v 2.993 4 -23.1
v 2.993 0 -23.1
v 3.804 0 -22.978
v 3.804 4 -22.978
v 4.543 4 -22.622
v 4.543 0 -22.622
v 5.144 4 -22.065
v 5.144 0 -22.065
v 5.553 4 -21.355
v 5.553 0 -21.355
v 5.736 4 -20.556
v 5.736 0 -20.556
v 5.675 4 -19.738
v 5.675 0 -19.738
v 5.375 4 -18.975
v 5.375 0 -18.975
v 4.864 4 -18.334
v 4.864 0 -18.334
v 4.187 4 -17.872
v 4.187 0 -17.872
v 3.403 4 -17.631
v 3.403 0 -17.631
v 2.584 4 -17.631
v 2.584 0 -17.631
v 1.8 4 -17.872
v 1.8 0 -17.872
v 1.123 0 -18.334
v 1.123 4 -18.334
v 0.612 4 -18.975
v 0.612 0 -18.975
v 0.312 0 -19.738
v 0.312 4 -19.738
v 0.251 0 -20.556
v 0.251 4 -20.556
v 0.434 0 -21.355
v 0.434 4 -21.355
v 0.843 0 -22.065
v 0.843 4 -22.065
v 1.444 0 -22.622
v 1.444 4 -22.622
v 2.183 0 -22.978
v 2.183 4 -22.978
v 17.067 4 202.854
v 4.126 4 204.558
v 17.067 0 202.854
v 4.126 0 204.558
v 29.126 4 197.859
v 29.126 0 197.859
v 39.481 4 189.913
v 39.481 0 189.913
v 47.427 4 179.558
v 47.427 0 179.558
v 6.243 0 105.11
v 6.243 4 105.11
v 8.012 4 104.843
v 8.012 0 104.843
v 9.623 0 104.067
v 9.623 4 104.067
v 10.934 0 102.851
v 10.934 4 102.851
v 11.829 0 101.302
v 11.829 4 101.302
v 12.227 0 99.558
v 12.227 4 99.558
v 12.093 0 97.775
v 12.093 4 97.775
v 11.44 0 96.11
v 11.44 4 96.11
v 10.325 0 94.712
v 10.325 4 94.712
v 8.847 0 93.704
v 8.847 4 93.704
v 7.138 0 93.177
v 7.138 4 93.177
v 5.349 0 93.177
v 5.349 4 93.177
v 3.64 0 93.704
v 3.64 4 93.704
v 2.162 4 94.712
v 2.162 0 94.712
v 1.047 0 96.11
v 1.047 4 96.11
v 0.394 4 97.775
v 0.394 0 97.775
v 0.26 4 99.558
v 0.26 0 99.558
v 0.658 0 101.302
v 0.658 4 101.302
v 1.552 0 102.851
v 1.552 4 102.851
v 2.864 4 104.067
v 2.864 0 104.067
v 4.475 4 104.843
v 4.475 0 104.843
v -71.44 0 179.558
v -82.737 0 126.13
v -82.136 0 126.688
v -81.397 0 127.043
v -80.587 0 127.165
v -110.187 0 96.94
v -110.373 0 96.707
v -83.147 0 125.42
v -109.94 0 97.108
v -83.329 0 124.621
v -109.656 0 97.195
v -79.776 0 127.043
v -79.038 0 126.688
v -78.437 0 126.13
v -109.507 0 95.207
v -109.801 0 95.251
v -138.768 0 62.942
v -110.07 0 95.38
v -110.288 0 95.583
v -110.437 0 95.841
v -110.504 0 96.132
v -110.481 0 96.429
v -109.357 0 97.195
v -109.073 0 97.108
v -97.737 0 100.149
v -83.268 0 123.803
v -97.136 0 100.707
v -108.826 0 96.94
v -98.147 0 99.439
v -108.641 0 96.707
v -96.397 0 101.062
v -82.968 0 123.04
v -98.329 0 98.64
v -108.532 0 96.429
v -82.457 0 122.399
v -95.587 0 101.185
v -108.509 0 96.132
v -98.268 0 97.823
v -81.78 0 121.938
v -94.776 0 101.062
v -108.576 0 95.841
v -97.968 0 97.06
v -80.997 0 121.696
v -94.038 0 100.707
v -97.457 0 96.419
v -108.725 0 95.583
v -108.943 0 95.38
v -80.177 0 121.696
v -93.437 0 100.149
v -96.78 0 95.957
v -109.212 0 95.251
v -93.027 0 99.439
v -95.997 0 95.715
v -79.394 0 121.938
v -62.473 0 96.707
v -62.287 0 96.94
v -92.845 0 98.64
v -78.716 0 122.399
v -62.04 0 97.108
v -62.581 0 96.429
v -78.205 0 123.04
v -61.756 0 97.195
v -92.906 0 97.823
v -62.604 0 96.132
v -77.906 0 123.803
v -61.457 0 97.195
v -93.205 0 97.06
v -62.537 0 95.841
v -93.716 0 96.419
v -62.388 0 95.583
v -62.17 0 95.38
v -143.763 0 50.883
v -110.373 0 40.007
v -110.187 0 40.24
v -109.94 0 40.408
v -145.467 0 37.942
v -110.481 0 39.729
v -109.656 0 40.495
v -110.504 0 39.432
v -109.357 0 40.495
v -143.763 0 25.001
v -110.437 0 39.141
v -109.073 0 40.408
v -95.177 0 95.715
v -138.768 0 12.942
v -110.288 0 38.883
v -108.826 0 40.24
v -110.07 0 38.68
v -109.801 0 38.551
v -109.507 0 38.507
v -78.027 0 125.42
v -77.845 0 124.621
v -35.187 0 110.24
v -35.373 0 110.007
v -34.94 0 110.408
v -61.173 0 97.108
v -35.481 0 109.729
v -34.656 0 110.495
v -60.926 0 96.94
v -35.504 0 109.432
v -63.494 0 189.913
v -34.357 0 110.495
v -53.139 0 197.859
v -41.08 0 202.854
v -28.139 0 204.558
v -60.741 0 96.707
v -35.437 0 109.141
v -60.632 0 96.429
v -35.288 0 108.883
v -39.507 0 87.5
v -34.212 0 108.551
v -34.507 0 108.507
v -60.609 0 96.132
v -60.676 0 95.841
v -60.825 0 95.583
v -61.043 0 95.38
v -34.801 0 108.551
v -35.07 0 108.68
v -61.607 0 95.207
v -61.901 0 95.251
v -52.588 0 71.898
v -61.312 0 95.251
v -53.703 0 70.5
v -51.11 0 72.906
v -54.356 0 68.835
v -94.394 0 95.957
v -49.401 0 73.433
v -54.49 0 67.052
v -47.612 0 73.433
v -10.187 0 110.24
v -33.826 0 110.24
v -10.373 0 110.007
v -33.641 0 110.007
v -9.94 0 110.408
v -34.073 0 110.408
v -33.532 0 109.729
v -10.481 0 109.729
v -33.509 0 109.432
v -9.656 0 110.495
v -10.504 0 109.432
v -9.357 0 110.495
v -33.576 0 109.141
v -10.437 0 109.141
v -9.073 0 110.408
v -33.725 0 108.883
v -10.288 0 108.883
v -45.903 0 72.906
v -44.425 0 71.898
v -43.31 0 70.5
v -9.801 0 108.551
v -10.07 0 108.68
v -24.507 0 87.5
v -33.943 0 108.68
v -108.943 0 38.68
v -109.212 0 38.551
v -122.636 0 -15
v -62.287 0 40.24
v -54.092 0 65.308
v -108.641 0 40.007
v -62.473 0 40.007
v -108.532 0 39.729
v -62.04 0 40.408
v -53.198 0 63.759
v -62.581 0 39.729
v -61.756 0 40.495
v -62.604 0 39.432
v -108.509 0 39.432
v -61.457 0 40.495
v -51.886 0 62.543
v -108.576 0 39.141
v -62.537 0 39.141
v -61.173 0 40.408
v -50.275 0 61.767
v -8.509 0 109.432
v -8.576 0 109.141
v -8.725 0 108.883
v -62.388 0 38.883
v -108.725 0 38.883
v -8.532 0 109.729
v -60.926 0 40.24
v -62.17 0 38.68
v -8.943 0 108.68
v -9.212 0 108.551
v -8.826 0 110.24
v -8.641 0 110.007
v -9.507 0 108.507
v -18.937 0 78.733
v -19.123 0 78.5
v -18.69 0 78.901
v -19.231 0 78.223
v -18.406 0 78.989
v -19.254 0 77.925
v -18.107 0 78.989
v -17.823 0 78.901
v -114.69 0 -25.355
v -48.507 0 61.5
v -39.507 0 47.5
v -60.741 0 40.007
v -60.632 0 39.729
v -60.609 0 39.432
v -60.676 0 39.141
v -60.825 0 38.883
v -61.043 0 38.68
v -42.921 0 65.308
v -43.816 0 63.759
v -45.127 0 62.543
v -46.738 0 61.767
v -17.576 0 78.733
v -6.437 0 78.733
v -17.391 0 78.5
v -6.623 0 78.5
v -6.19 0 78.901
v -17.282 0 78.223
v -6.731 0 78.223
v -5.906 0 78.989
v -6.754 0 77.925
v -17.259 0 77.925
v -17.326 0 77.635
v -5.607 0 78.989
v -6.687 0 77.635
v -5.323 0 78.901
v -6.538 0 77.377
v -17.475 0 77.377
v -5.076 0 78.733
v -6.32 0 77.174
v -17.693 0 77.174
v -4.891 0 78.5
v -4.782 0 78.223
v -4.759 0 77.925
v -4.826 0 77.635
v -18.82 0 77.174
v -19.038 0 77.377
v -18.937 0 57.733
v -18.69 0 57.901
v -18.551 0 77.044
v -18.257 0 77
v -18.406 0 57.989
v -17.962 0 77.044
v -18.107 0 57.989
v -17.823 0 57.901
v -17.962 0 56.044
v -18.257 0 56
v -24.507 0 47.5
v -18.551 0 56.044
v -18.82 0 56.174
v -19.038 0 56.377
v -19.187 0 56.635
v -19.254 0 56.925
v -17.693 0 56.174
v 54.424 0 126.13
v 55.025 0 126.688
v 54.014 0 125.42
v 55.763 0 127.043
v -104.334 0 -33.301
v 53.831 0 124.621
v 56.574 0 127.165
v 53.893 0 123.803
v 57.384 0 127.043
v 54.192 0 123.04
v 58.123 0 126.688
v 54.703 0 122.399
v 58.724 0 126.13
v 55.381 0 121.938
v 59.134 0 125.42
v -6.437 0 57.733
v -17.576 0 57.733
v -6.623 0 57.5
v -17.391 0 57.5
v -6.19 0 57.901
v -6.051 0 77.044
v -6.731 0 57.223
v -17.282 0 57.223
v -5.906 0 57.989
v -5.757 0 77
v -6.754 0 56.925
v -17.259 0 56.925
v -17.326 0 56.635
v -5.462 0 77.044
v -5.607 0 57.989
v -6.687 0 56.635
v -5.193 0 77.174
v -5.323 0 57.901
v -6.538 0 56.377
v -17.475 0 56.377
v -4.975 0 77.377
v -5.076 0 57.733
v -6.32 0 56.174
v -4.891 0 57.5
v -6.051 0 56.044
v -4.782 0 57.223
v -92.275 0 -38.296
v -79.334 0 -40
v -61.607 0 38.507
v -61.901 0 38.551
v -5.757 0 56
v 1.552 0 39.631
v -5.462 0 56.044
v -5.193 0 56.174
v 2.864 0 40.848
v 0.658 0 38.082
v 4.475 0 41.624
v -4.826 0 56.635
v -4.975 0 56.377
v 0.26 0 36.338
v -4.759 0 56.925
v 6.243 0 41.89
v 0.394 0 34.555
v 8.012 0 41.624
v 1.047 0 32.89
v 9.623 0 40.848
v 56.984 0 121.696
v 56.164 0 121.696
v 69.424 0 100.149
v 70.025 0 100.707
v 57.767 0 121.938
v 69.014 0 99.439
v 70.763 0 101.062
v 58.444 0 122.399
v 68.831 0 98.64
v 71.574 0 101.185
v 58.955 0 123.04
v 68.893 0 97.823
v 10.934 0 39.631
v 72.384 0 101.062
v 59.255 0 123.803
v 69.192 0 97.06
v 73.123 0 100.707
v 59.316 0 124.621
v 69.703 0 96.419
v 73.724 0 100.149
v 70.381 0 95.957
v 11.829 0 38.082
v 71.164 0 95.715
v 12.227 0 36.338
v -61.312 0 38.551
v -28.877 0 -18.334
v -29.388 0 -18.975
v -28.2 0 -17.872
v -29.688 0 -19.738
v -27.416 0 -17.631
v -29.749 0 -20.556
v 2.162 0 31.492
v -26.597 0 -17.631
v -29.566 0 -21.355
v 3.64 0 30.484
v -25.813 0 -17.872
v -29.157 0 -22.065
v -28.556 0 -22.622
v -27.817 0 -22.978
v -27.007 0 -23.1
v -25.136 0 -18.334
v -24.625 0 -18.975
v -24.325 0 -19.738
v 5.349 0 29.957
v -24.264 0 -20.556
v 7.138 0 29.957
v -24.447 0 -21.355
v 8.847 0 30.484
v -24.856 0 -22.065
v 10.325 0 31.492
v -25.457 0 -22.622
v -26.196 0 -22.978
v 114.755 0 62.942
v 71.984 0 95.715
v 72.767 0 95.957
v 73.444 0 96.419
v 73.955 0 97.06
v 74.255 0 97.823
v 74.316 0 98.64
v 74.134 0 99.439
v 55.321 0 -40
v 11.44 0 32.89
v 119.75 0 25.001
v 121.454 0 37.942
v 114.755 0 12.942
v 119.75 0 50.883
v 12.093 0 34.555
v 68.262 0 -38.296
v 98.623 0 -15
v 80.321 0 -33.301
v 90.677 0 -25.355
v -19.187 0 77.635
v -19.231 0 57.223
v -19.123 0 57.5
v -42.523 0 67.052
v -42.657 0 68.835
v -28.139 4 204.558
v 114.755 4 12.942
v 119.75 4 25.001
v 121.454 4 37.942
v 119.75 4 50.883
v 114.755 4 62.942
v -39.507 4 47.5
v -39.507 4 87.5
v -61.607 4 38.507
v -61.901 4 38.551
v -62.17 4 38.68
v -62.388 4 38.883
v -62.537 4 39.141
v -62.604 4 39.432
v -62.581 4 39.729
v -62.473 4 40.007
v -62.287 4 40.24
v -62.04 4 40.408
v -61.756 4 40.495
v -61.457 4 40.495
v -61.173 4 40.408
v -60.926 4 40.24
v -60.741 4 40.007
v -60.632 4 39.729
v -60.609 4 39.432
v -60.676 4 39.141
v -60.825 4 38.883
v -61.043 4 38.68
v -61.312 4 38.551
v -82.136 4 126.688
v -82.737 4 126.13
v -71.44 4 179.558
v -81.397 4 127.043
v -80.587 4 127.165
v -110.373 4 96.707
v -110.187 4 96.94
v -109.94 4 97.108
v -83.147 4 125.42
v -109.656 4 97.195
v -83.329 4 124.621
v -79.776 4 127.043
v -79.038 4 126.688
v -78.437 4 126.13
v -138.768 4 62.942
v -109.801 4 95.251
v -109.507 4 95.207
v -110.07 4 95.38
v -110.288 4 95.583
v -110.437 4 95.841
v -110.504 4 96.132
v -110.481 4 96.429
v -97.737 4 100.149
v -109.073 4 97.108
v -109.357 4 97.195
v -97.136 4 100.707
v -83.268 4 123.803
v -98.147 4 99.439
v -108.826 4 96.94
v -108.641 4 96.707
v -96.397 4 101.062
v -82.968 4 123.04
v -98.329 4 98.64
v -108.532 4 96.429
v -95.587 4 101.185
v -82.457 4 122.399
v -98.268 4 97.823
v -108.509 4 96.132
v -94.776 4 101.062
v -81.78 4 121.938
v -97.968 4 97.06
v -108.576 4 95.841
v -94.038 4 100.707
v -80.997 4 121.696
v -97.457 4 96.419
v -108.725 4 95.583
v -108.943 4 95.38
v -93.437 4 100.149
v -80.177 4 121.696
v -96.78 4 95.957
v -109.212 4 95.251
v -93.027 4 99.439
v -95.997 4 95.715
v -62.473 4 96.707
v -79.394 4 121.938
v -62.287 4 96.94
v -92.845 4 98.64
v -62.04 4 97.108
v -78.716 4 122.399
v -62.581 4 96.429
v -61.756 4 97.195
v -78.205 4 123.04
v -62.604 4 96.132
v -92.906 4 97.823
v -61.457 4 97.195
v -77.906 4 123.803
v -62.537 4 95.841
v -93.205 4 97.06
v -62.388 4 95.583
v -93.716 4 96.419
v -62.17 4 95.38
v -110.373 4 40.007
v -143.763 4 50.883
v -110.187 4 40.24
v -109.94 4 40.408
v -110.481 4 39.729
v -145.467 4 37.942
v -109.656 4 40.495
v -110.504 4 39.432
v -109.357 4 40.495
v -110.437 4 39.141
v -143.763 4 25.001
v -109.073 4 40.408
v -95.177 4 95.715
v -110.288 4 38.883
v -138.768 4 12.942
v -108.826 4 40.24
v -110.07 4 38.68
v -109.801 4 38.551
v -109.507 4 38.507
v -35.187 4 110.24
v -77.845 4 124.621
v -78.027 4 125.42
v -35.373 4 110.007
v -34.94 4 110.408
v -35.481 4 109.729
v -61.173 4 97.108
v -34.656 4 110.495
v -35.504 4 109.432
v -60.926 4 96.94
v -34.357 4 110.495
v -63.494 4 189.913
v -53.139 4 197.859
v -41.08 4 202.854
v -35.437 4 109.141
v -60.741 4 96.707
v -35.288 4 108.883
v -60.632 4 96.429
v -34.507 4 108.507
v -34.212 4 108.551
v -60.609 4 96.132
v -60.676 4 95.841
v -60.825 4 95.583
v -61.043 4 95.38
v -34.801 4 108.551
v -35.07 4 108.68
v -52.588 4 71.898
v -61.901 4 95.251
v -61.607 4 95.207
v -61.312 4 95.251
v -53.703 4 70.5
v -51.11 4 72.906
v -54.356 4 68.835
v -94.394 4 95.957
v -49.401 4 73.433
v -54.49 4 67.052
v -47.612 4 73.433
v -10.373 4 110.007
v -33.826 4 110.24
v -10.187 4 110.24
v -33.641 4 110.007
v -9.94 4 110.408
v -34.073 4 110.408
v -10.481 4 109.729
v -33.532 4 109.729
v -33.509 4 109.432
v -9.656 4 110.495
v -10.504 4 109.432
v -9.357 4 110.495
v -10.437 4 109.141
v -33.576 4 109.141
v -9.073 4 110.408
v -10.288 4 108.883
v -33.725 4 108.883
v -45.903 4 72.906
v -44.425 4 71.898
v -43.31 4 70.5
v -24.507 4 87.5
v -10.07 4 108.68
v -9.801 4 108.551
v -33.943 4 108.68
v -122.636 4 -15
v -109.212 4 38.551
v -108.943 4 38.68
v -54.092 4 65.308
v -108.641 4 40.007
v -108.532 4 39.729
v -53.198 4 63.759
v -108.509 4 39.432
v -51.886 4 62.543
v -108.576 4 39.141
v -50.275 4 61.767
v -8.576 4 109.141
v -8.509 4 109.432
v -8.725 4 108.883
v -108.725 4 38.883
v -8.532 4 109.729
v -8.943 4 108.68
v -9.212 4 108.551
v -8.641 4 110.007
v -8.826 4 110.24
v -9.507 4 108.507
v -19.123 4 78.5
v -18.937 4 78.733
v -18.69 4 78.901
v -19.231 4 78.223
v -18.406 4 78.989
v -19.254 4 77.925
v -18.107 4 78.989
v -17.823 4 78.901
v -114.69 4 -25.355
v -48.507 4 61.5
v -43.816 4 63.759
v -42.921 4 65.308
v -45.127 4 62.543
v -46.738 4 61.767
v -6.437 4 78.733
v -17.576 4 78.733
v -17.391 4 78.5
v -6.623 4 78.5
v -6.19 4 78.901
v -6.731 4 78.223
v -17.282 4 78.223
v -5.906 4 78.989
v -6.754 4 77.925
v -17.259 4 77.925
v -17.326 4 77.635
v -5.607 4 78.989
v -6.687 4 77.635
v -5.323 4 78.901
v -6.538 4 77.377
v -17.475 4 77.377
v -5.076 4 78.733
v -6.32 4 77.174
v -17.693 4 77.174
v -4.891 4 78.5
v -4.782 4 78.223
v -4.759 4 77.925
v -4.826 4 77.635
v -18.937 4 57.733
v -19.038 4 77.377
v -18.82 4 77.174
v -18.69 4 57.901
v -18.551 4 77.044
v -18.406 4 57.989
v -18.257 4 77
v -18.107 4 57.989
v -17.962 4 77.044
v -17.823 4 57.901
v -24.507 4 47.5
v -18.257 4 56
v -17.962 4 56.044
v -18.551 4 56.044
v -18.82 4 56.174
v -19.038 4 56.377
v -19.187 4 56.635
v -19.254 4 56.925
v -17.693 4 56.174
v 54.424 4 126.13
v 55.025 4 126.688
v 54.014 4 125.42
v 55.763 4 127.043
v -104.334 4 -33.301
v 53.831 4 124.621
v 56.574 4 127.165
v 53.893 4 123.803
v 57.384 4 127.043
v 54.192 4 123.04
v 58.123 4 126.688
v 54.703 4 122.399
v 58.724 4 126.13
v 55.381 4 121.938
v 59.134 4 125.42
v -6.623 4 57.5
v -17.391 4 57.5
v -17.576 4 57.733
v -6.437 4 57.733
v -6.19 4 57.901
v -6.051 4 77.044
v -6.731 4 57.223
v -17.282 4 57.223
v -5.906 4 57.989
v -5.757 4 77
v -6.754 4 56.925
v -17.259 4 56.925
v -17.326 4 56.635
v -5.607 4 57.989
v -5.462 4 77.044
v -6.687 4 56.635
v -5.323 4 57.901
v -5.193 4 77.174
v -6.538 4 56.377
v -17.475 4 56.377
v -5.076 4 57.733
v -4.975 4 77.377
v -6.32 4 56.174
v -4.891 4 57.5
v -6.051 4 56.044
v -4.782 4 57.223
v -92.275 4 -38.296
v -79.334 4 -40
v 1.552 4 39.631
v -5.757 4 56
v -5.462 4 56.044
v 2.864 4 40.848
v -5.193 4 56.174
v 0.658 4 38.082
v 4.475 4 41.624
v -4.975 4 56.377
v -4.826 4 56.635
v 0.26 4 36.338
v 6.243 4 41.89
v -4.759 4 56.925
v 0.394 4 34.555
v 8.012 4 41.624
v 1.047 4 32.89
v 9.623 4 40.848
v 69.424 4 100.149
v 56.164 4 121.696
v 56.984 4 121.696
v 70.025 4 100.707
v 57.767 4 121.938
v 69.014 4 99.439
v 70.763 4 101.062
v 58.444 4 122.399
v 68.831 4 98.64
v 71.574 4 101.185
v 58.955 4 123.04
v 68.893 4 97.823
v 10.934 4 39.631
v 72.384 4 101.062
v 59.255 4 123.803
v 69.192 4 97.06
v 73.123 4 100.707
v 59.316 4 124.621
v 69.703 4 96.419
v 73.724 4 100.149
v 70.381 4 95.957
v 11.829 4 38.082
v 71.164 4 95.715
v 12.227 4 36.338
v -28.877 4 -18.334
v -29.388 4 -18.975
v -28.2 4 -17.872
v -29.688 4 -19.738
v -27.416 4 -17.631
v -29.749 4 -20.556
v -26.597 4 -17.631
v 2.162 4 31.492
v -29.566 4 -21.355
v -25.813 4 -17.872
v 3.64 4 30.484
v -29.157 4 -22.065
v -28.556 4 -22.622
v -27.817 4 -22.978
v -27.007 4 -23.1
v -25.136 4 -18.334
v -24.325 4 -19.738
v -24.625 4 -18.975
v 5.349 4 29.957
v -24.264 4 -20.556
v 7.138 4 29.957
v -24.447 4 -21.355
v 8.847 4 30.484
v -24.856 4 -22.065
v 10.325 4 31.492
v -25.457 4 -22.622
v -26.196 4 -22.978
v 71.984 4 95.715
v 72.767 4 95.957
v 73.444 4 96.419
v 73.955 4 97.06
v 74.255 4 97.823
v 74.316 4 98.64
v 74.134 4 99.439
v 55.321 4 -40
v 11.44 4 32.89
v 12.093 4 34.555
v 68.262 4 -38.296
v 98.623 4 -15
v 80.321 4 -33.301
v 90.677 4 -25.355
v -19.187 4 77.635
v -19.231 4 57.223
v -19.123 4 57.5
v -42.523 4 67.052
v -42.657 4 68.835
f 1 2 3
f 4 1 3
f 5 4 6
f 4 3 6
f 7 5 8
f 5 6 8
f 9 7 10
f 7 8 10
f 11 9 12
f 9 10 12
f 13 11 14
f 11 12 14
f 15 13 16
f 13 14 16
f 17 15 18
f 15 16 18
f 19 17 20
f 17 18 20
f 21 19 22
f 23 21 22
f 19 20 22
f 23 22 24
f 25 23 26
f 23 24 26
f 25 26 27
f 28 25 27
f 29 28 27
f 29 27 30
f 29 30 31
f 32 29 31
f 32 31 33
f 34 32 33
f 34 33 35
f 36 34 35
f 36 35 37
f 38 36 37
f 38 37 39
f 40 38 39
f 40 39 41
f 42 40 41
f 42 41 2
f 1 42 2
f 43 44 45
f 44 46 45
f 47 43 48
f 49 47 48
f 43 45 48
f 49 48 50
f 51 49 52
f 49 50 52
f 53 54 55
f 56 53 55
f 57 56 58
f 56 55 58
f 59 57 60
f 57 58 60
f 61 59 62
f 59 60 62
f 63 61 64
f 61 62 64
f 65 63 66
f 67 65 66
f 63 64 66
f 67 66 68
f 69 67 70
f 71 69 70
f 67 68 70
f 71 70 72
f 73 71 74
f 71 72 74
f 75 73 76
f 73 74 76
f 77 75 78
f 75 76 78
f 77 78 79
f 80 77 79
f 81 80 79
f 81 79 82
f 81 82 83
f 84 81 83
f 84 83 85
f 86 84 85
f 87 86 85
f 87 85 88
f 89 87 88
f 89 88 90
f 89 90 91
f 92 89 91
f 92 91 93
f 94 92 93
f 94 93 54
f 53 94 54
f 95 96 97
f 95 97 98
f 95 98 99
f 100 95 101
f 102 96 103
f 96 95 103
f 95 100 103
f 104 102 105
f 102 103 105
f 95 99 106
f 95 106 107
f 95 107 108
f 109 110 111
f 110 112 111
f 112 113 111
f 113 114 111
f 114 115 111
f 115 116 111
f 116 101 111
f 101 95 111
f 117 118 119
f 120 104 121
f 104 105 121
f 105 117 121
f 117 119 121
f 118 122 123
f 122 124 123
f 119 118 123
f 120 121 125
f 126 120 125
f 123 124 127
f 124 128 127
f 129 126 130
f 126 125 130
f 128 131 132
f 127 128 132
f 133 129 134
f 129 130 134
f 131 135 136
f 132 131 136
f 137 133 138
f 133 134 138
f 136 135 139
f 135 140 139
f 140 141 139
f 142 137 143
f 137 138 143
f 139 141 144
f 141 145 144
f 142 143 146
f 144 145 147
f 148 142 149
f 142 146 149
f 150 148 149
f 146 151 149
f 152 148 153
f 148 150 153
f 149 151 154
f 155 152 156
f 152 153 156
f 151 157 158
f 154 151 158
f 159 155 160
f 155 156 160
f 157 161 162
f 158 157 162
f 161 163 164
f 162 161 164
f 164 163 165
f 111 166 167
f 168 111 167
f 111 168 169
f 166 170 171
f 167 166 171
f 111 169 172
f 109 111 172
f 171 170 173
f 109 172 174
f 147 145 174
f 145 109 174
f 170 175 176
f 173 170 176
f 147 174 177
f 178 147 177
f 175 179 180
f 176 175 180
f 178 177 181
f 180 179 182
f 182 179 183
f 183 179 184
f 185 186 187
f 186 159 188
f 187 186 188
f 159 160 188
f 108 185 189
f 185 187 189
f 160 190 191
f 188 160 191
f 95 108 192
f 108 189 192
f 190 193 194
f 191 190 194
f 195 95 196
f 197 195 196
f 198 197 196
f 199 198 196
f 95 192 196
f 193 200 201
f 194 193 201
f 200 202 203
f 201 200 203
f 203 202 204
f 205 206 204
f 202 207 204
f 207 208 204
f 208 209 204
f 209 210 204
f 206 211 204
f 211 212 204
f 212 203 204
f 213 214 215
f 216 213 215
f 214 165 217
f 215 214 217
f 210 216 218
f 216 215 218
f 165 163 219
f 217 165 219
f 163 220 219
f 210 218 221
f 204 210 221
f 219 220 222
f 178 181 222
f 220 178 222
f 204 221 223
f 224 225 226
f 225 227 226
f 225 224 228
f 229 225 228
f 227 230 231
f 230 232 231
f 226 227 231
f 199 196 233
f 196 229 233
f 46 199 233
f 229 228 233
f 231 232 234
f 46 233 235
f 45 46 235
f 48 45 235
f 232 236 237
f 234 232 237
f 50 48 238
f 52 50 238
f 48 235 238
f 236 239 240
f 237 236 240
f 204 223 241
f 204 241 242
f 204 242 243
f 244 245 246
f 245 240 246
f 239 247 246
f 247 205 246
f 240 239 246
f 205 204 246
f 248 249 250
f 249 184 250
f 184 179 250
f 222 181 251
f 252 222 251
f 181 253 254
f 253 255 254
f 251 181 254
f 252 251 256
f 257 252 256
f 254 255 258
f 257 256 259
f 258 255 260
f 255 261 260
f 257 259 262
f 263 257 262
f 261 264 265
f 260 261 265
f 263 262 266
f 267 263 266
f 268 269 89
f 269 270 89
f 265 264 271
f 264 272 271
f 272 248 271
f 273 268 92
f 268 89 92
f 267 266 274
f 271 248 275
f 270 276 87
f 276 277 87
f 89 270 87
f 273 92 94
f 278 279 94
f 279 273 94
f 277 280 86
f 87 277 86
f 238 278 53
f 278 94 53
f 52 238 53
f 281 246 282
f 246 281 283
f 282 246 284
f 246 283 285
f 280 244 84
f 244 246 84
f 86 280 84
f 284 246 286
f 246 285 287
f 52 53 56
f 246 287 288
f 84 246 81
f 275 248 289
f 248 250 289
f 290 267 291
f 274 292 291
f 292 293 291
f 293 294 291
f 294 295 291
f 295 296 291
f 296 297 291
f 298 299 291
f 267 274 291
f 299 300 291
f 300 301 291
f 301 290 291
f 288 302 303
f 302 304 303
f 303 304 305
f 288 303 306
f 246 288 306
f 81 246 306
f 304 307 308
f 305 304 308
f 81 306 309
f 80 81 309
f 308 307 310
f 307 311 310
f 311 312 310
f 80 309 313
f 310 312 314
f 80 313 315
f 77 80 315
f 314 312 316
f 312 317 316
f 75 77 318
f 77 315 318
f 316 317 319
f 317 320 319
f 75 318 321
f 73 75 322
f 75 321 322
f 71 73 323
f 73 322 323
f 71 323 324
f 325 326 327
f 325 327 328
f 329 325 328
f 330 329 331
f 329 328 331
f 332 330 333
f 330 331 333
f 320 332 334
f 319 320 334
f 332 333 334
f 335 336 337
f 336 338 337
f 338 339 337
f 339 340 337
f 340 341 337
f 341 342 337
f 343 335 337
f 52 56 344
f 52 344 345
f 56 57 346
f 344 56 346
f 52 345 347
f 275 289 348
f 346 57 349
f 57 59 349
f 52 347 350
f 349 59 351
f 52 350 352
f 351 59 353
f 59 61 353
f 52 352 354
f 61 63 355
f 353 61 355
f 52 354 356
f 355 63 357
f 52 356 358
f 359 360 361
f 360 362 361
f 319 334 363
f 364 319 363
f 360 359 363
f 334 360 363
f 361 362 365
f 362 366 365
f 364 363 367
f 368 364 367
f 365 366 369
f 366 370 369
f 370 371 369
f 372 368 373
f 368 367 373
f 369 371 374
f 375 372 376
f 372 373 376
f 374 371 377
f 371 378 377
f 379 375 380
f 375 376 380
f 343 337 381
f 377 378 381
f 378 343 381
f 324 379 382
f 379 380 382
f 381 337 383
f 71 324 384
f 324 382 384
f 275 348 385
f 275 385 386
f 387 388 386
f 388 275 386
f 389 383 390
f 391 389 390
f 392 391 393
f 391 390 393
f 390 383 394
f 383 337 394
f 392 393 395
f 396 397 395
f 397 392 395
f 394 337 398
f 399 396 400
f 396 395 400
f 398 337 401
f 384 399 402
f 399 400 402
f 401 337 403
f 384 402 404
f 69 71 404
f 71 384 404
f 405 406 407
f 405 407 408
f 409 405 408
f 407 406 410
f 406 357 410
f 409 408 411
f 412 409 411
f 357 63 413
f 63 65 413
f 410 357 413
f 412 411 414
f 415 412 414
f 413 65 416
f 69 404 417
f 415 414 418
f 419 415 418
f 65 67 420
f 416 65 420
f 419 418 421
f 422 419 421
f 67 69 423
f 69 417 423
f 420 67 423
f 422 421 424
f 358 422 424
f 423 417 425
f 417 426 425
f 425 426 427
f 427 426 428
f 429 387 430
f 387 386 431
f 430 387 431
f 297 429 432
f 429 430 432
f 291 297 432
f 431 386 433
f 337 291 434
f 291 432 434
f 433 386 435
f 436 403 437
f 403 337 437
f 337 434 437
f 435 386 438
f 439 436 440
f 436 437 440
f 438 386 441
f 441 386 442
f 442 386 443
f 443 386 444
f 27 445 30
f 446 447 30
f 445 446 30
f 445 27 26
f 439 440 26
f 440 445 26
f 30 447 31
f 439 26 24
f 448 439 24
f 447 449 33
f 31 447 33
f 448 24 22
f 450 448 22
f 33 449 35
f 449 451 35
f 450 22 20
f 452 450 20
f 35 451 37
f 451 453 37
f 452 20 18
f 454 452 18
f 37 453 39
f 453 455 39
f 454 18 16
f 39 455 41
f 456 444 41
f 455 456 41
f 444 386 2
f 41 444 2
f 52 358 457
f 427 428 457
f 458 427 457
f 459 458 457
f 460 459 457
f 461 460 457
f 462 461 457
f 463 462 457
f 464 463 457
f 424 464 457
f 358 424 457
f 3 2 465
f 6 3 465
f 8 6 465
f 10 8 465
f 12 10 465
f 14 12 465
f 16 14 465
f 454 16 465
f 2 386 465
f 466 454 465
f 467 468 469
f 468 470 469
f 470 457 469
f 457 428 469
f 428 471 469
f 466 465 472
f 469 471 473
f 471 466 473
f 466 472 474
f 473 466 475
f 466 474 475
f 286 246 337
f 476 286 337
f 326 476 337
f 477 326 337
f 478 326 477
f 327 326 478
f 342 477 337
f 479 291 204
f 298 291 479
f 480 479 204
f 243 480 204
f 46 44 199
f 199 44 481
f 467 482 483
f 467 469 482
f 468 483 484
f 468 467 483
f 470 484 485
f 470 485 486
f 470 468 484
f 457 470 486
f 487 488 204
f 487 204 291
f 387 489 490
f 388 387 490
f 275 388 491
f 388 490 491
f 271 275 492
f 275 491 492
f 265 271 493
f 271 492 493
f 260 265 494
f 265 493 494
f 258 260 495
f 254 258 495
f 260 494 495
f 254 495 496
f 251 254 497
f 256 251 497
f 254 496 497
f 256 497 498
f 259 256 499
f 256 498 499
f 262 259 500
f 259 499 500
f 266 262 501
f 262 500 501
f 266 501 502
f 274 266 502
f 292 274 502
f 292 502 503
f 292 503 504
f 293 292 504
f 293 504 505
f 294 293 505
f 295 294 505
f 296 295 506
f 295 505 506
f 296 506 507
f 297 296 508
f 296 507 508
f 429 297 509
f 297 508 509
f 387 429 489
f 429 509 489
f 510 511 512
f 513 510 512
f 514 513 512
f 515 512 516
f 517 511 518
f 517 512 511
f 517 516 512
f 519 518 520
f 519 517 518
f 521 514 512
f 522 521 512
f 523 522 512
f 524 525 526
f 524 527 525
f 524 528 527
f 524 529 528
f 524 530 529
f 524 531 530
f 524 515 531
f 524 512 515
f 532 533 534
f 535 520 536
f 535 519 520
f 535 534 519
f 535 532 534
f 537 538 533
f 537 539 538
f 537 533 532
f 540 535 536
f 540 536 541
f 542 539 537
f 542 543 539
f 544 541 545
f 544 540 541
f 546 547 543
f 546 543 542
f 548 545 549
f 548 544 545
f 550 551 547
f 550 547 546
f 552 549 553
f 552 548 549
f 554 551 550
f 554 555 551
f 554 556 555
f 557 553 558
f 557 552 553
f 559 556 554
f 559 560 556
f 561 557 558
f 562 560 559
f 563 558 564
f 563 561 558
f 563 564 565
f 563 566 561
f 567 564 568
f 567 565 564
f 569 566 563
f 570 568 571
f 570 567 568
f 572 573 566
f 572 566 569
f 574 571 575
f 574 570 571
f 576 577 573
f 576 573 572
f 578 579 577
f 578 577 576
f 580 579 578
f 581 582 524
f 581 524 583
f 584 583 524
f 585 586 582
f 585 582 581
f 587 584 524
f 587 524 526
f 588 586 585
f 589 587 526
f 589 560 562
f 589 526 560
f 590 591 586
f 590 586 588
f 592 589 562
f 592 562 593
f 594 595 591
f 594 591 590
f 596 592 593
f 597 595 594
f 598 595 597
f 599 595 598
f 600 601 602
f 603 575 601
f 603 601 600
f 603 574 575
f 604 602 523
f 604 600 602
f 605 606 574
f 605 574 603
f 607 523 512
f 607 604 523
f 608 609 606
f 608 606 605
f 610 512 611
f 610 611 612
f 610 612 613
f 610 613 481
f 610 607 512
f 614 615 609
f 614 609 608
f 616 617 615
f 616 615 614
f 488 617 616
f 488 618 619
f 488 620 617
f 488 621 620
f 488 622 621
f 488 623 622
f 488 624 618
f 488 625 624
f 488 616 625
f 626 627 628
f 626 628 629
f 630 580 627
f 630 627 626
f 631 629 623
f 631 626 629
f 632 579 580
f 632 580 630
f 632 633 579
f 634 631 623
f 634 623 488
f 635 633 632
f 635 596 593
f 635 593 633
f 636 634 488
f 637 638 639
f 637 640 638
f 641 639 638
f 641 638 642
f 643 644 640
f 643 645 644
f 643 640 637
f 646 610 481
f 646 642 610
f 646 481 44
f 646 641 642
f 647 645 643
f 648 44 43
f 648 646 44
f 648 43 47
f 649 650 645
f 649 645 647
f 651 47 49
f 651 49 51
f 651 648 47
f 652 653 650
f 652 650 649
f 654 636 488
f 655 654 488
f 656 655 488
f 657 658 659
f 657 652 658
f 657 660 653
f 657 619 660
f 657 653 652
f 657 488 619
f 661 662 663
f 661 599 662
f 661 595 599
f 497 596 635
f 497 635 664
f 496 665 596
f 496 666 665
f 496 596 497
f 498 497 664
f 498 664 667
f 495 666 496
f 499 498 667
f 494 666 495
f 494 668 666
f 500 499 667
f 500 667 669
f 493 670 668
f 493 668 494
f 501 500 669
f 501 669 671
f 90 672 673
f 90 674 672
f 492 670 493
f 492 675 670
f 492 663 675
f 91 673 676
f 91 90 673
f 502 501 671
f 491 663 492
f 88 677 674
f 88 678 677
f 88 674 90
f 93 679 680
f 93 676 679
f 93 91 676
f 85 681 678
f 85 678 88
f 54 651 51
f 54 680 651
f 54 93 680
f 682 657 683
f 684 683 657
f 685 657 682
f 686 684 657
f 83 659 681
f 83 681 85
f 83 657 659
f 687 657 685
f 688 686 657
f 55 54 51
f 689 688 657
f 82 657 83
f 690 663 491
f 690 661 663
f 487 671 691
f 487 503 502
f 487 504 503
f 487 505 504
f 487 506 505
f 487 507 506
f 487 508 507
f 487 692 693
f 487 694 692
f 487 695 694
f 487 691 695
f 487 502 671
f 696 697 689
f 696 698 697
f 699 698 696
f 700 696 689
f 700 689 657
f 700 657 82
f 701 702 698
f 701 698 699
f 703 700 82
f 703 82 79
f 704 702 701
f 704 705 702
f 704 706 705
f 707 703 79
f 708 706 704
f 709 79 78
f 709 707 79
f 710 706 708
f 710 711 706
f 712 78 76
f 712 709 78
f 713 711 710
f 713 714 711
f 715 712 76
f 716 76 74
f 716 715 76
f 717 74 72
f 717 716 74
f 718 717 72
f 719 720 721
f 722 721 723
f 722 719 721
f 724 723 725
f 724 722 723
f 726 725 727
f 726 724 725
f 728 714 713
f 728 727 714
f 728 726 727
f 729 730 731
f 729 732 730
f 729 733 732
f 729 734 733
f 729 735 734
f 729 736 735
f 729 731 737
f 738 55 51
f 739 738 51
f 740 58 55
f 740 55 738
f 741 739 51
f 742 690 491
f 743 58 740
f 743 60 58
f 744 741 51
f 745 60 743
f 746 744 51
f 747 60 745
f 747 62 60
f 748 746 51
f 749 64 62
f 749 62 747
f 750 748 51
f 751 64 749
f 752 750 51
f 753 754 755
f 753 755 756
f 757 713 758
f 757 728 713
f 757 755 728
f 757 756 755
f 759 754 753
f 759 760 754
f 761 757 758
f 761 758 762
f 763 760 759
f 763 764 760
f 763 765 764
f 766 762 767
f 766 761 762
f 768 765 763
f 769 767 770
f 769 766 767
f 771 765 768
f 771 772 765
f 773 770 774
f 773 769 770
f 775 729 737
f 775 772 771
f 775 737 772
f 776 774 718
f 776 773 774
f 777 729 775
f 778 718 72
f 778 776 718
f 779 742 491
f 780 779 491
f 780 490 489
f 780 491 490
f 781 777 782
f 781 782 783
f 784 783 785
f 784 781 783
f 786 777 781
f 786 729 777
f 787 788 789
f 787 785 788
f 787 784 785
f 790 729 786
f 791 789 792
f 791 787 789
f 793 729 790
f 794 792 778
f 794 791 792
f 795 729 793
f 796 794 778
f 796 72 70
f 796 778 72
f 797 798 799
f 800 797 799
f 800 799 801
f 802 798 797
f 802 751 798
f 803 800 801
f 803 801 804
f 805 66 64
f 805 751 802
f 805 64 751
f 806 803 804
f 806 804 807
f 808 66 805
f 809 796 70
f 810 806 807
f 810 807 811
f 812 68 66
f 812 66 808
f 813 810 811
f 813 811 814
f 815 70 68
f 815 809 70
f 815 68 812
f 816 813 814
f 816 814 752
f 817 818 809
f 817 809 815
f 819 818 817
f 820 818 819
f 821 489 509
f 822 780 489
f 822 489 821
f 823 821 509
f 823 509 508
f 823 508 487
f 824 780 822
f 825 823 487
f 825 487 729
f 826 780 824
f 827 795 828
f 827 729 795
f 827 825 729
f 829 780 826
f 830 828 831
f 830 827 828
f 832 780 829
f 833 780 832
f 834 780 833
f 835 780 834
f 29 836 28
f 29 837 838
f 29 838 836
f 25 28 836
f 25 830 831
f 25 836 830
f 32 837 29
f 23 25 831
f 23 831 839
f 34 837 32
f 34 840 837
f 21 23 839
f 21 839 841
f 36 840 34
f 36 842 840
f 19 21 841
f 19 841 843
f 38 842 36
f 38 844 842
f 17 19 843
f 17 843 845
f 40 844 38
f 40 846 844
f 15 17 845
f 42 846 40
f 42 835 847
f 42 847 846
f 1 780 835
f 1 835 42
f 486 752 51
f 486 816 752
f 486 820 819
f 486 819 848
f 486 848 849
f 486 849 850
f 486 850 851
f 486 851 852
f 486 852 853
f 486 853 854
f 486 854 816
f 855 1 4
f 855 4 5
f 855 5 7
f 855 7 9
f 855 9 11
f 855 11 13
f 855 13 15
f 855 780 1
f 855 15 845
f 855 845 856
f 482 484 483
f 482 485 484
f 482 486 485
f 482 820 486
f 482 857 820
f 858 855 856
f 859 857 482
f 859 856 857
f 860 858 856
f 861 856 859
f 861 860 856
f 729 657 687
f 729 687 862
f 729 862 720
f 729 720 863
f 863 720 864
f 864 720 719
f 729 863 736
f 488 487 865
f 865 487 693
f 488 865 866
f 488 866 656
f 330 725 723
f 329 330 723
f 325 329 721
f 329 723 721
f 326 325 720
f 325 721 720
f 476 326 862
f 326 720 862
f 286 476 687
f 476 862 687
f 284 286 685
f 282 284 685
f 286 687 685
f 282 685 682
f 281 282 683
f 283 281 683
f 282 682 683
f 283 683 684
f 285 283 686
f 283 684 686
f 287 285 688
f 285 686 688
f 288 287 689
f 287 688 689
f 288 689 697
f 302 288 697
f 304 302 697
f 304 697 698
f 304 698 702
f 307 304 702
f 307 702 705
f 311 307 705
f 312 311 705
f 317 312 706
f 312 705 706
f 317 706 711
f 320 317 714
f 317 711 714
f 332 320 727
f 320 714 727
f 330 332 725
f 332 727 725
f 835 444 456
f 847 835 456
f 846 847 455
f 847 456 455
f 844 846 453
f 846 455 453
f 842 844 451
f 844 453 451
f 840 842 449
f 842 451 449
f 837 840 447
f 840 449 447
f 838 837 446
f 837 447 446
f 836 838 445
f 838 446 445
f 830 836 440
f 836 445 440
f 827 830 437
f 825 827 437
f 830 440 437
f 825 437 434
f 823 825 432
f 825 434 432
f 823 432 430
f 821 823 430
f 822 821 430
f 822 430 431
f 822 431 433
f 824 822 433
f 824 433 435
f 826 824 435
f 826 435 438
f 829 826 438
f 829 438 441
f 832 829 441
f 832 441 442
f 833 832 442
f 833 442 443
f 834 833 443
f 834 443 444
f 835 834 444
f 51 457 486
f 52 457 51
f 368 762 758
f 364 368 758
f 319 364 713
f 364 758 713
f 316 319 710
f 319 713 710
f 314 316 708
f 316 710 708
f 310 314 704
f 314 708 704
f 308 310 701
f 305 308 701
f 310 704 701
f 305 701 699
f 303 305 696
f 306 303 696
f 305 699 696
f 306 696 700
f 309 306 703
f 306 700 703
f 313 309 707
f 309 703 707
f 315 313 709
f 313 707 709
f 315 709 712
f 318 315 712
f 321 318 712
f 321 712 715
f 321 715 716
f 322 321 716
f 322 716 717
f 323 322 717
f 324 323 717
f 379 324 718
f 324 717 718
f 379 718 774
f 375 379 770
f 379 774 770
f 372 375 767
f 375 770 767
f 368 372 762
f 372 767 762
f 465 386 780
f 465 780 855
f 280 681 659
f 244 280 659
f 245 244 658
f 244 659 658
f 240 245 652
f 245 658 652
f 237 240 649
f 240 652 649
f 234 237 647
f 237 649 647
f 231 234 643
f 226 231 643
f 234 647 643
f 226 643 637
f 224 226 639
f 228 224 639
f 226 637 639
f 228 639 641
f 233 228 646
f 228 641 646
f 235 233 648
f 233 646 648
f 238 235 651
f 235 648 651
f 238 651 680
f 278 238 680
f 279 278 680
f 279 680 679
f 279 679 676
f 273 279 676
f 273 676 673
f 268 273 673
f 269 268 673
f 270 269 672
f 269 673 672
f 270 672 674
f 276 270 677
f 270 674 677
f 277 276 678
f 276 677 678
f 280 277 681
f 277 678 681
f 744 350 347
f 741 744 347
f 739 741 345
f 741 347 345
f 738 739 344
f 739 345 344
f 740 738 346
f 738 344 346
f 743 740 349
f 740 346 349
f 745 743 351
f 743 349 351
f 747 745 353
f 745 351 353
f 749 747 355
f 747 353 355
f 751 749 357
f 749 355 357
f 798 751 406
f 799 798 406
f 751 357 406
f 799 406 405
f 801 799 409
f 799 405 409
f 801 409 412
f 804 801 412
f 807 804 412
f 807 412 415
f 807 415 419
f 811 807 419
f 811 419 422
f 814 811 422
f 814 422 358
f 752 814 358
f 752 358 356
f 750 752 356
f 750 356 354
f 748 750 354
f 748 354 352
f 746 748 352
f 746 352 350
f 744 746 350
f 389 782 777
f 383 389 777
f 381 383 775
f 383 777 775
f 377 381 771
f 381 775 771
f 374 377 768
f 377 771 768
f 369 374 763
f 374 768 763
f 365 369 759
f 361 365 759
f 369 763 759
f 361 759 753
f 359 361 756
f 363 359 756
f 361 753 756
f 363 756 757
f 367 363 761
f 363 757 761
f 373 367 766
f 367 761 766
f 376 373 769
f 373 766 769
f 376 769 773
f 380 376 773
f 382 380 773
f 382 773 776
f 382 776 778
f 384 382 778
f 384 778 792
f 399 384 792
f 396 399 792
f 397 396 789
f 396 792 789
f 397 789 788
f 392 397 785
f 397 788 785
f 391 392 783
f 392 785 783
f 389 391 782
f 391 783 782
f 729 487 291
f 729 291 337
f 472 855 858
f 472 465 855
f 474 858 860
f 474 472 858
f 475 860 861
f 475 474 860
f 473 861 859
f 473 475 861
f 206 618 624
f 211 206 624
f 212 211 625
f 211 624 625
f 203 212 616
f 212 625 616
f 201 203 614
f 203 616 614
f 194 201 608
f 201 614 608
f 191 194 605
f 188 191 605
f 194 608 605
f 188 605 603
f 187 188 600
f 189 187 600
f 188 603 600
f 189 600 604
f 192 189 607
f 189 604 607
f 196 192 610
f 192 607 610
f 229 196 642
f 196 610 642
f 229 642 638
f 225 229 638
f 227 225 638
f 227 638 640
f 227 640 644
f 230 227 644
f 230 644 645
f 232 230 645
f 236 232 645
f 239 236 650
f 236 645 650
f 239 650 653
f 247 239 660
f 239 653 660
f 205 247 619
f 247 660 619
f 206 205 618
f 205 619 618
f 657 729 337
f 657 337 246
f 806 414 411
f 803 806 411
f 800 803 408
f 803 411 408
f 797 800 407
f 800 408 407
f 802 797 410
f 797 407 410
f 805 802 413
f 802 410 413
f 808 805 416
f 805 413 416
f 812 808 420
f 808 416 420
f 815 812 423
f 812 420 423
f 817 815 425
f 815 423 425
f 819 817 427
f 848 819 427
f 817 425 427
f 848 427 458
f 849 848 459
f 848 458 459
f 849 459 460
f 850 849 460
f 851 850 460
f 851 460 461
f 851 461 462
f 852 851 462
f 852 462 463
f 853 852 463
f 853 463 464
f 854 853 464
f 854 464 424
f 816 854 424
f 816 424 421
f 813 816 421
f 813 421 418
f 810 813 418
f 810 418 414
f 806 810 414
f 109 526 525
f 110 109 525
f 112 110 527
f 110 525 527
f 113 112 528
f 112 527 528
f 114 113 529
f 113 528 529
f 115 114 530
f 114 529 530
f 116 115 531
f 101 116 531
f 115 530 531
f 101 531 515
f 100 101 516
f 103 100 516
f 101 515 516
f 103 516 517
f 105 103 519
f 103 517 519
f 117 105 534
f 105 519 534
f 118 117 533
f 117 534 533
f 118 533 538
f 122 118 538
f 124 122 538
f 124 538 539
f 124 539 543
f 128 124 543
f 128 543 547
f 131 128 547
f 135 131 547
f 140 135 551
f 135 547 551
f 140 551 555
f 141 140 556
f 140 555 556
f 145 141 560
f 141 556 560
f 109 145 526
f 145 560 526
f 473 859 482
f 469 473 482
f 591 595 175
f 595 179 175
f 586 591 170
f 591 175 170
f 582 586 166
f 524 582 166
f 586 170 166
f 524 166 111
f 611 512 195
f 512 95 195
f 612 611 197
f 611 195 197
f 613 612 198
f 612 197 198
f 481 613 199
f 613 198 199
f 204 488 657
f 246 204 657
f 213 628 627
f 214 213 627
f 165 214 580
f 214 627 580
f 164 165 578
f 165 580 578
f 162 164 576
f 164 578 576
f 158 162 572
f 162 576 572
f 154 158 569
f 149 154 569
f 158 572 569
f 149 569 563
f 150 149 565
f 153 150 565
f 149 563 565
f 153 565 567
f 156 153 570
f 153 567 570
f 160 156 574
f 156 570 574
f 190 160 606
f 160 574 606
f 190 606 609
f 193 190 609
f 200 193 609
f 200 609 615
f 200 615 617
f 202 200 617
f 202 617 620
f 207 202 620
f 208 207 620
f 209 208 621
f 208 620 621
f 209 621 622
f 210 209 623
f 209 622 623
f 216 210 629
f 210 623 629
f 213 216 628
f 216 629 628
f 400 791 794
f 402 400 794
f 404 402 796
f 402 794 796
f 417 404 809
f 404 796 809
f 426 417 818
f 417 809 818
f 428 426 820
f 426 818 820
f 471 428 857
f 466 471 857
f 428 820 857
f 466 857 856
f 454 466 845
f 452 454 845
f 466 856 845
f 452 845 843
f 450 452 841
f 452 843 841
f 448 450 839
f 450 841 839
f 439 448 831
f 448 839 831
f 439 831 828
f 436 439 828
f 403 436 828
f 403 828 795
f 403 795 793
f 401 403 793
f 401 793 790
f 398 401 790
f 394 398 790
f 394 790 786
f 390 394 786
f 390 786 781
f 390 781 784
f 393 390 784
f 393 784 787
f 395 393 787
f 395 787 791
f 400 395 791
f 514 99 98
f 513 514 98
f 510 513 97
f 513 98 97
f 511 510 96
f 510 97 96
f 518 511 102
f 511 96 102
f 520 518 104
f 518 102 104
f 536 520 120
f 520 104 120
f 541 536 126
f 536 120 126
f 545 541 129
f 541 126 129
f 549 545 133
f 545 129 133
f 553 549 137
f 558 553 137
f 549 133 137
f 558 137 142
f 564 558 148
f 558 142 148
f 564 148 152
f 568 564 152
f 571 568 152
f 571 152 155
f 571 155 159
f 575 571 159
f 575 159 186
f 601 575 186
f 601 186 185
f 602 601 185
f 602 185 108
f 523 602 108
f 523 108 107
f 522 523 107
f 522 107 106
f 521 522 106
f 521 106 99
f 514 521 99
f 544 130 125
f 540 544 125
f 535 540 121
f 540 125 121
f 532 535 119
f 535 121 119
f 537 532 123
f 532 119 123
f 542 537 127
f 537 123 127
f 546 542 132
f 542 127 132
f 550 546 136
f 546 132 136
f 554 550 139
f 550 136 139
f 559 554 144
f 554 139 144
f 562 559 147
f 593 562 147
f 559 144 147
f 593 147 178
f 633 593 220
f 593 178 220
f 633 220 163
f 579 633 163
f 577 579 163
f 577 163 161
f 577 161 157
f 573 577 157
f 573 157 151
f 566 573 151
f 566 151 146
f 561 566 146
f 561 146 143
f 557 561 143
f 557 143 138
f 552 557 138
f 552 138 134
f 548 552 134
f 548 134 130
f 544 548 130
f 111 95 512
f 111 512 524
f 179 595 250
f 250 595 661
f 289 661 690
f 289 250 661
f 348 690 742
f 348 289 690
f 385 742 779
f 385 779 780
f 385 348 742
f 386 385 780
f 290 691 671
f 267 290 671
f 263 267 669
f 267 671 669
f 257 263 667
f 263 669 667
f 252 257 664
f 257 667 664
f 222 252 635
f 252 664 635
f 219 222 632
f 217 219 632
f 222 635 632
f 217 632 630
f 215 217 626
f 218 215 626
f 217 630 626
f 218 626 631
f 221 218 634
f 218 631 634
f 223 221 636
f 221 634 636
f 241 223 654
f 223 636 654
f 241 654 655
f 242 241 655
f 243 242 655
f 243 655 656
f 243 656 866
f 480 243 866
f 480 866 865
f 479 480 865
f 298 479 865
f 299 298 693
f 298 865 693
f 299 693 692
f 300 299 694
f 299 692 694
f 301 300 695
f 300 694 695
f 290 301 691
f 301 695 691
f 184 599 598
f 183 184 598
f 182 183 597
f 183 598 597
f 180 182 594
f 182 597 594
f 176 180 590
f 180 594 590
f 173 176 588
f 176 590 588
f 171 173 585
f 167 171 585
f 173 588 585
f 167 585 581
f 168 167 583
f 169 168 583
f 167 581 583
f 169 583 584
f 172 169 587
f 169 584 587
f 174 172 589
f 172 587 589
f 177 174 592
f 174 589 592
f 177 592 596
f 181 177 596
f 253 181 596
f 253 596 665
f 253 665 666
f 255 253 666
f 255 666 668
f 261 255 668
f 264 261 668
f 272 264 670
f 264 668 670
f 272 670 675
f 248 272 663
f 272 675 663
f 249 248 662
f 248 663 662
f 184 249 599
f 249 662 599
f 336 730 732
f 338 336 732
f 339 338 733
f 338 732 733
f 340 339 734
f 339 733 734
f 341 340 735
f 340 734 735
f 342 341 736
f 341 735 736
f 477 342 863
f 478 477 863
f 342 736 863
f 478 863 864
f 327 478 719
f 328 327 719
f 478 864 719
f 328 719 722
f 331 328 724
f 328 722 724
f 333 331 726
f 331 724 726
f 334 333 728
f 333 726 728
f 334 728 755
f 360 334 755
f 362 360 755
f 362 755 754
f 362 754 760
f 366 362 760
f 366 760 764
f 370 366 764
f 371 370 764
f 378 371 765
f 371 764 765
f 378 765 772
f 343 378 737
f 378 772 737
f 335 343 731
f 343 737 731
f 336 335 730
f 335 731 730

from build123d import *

# Parameters (mm, degrees)
SKETCH1_W           = 100
SKETCH1_H           = 80
BOSS_EXTRUDE1_DEPTH = 4
SKETCH2_R           = 1
CUT_EXTRUDE1_DEPTH  = 65.156059729
BOSS_EXTRUDE2_DEPTH = 4
SKETCH4_R           = 1
CUT_EXTRUDE2_DEPTH  = 4
SKETCH5_R           = 1
CUT_EXTRUDE3_DEPTH  = 4
SKETCH6_R           = 6
CUT_EXTRUDE4_DEPTH  = 95.424573073
BOSS_EXTRUDE3_DEPTH = 4
SKETCH8_R           = 2.75
CUT_EXTRUDE5_DEPTH  = 308.949597178
CUT_EXTRUDE6_DEPTH  = 308.949597178
SKETCH11_R          = 1
SKETCH11_R_2        = 6
SKETCH11_W          = 15
SKETCH11_H          = 40
CUT_EXTRUDE7_DEPTH  = 4
SKETCH14_R          = 1
SKETCH14_R_2        = 6
BOSS_EXTRUDE5_DEPTH = 4
SKETCH15_R          = 6
CUT_EXTRUDE8_DEPTH  = 256.598728949
FILLET1_R           = 50


with BuildPart() as part:
    # Sketch1 → Boss-Extrude1 (new body)
    with BuildSketch(Plane(origin=(0, 0, 0), x_dir=(1, 0, 0), z_dir=(0, 1, 0))):
        Rectangle(SKETCH1_W, SKETCH1_H)
    extrude(amount=BOSS_EXTRUDE1_DEPTH)

    # Sketch2 → Cut-Extrude1 (cut, through all)
    with BuildSketch(Plane(origin=(0, 4, 0), x_dir=(1, 0, 0), z_dir=(0, 1, 0))):
        with Locations((-40, 30)):
            Circle(SKETCH2_R)
        with Locations((16.7, 30)):
            Circle(SKETCH2_R)
        with Locations((16.7, -17.9)):
            Circle(SKETCH2_R)
        with Locations((-40, -17.9)):
            Circle(SKETCH2_R)
    extrude(amount=-CUT_EXTRUDE1_DEPTH, mode=Mode.SUBTRACT)

    # Sketch3 → Boss-Extrude2 (add)
    with BuildSketch(Plane(origin=(0, 4, 0), x_dir=(1, 0, 0), z_dir=(0, 1, 0))):
        Polygon((7.993464363, -40), (50, -40), (50, -80), (-50, -80), (-50, -40), (-32.006535637, -40), (-32.006535637, -55), (7.993464363, -55), align=None)
    extrude(amount=-BOSS_EXTRUDE2_DEPTH)

    # Sketch4 → Cut-Extrude2 (cut)
    with BuildSketch(Plane(origin=(0, 4, 0), x_dir=(1, 0, 0), z_dir=(0, 1, 0))):
        with Locations((-22.506535637, -61.25)):
            Circle(SKETCH4_R)
        with Locations((-22.506535637, -73.75)):
            Circle(SKETCH4_R)
        with Locations((-1.506535637, -73.75)):
            Circle(SKETCH4_R)
        with Locations((-1.506535637, -61.25)):
            Circle(SKETCH4_R)
    extrude(amount=-CUT_EXTRUDE2_DEPTH, mode=Mode.SUBTRACT)

    # Sketch5 → Cut-Extrude3 (cut)
    with BuildSketch(Plane(origin=(0, 4, 0), x_dir=(1, 0, 0), z_dir=(0, 1, 0))):
        with Locations((30, -45)):
            Circle(SKETCH5_R)
        with Locations((30, -70)):
            Circle(SKETCH5_R)
    extrude(amount=-CUT_EXTRUDE3_DEPTH, mode=Mode.SUBTRACT)

    # Sketch6 → Cut-Extrude4 (cut, through all)
    with BuildSketch(Plane(origin=(0, 4, 0), x_dir=(1, 0, 0), z_dir=(0, 1, 0))):
        with Locations((-12.006535637, -31)):
            Circle(SKETCH6_R)
    extrude(amount=-CUT_EXTRUDE4_DEPTH, mode=Mode.SUBTRACT)

    # Sketch7 → Boss-Extrude3 (add)
    with BuildSketch(Plane.XZ):
        with BuildLine():
            Line((-146.240473223, -40), (-50, -40))
            Line((-50, -40), (-50, 80))
            Line((-50, 80), (50, 80))
            Line((50, 80), (50, -40))
            Line((50, -40), (122.22740195, -40))
            ThreePointArc((122.22740195, -40), (148.208164063, -25), (148.208164063, 5))
            Line((148.208164063, 5), (13.974226477, 237.5))
            ThreePointArc((13.974226477, 237.5), (-12.006535637, 252.5), (-37.98729775, 237.5))
            Line((-37.98729775, 237.5), (-172.221235337, 5))
            ThreePointArc((-172.221235337, 5), (-172.221235337, -25), (-146.240473223, -40))
        make_face()
    extrude(amount=-BOSS_EXTRUDE3_DEPTH)

    # Sketch8 → Cut-Extrude5 (cut, through all)
    with BuildSketch(Plane.XZ):
        with Locations((-27.006535637, -20.35)):
            Circle(SKETCH8_R)
        with Locations((2.993464363, -20.35)):
            Circle(SKETCH8_R)
        with Locations((-80.586867359, 124.415381057)):
            Circle(SKETCH8_R)
        with Locations((-95.586867359, 98.434618943)):
            Circle(SKETCH8_R)
        with Locations((71.573796086, 98.434618943)):
            Circle(SKETCH8_R)
        with Locations((56.573796086, 124.415381057)):
            Circle(SKETCH8_R)
    extrude(amount=-CUT_EXTRUDE5_DEPTH, mode=Mode.SUBTRACT)

    # Sketch9 → Cut-Extrude6 (cut, through all)
    with BuildSketch(Plane(origin=(0, 4, 0), x_dir=(1, 0, 0), z_dir=(0, 1, 0))):
        with BuildLine():
            Line((-172.221235337, -5), (-153.20199745, -37.942286341))
            Line((-153.20199745, -37.942286341), (-108.20199745, 40))
            Line((-108.20199745, 40), (-146.240473223, 40))
            ThreePointArc((-146.240473223, 40), (-172.221235337, 25), (-172.221235337, -5))
        make_face()
        with BuildLine():
            Line((32.993464363, -204.557713659), (-57.006535637, -204.557713659))
            Line((-57.006535637, -204.557713659), (-37.98729775, -237.5))
            ThreePointArc((-37.98729775, -237.5), (-12.006535637, -252.5), (13.974226477, -237.5))
            Line((13.974226477, -237.5), (32.993464363, -204.557713659))
        make_face()
        with BuildLine():
            Line((122.22740195, 40), (84.188926177, 40))
            Line((84.188926177, 40), (129.188926177, -37.942286341))
            Line((129.188926177, -37.942286341), (148.208164063, -5))
            ThreePointArc((148.208164063, -5), (148.208164063, 25), (122.22740195, 40))
        make_face()
    extrude(amount=-CUT_EXTRUDE6_DEPTH, mode=Mode.SUBTRACT)

    # Sketch11 → Cut-Extrude7 (cut)
    with BuildSketch(Plane(origin=(0, 4, 0), x_dir=(1, 0, 0), z_dir=(0, 1, 0))):
        with Locations((-109.506535637, -96.206535637)):
            Circle(SKETCH11_R)
        with Locations((-109.506535637, -39.506535637)):
            Circle(SKETCH11_R)
        with Locations((-61.606535637, -39.506535637)):
            Circle(SKETCH11_R)
        with Locations((-61.606535637, -96.206535637)):
            Circle(SKETCH11_R)
        with Locations((-34.506535637, -109.506535637)):
            Circle(SKETCH11_R)
        with Locations((-9.506535637, -109.506535637)):
            Circle(SKETCH11_R)
        with Locations((-5.756535637, -78)):
            Circle(SKETCH11_R)
        with Locations((-18.256535637, -78)):
            Circle(SKETCH11_R)
        with Locations((-18.256535637, -57)):
            Circle(SKETCH11_R)
        with Locations((-5.756535637, -57)):
            Circle(SKETCH11_R)
        with Locations((-48.506535637, -67.5)):
            Circle(SKETCH11_R_2)
        with Locations((-32.006535637, -67.5)):
            Rectangle(SKETCH11_W, SKETCH11_H)
    extrude(amount=-CUT_EXTRUDE7_DEPTH, mode=Mode.SUBTRACT)

    # Sketch14 → Boss-Extrude5 (add)
    with BuildSketch(Plane(origin=(0, 4, 0), x_dir=(1, 0, 0), z_dir=(0, 1, 0))):
        Polygon((7.993464363, -40), (-32.006535637, -40), (-32.006535637, -47.5), (-24.506535637, -47.5), (-24.506535637, -55), (7.993464363, -55), align=None)
        with Locations((-22.506535637, -61.25)):
            Circle(SKETCH14_R)
        with Locations((-1.506535637, -61.25)):
            Circle(SKETCH14_R)
        with Locations((-22.506535637, -73.75)):
            Circle(SKETCH14_R)
        with Locations((-1.506535637, -73.75)):
            Circle(SKETCH14_R)
        with Locations((30, -70)):
            Circle(SKETCH14_R)
        with Locations((30, -45)):
            Circle(SKETCH14_R)
        with Locations((-12.006535637, -31)):
            Circle(SKETCH14_R_2)
        with Locations((-40, -17.9)):
            Circle(SKETCH14_R)
        with Locations((16.7, -17.9)):
            Circle(SKETCH14_R)
        with Locations((-40, 30)):
            Circle(SKETCH14_R)
        with Locations((16.7, 30)):
            Circle(SKETCH14_R)
    extrude(amount=-BOSS_EXTRUDE5_DEPTH)

    # Sketch15 → Cut-Extrude8 (cut, through all)
    with BuildSketch(Plane(origin=(0, 4, 0), x_dir=(1, 0, 0), z_dir=(0, 1, 0))):
        with Locations((-48.506535637, -67.5)):
            Circle(SKETCH15_R)
        with Locations((6.243464363, -99.109927238)):
            Circle(SKETCH15_R)
        with Locations((6.243464363, -35.890072762)):
            Circle(SKETCH15_R)
    extrude(amount=-CUT_EXTRUDE8_DEPTH, mode=Mode.SUBTRACT)

    # Fillet1
    fillet1_edges = [part.edges().sort_by_distance(p)[0] for p in [
        (-57.006535637, 2, 204.557713659),
        (32.993464363, 2, 204.557713659),
        (129.188926177, 2, 37.942286341),
        (84.188926177, 2, -40),
        (-108.20199745, 2, -40),
        (-153.20199745, 2, 37.942286341),
    ]]
    fillet(fillet1_edges, radius=FILLET1_R)


solid = part.part
